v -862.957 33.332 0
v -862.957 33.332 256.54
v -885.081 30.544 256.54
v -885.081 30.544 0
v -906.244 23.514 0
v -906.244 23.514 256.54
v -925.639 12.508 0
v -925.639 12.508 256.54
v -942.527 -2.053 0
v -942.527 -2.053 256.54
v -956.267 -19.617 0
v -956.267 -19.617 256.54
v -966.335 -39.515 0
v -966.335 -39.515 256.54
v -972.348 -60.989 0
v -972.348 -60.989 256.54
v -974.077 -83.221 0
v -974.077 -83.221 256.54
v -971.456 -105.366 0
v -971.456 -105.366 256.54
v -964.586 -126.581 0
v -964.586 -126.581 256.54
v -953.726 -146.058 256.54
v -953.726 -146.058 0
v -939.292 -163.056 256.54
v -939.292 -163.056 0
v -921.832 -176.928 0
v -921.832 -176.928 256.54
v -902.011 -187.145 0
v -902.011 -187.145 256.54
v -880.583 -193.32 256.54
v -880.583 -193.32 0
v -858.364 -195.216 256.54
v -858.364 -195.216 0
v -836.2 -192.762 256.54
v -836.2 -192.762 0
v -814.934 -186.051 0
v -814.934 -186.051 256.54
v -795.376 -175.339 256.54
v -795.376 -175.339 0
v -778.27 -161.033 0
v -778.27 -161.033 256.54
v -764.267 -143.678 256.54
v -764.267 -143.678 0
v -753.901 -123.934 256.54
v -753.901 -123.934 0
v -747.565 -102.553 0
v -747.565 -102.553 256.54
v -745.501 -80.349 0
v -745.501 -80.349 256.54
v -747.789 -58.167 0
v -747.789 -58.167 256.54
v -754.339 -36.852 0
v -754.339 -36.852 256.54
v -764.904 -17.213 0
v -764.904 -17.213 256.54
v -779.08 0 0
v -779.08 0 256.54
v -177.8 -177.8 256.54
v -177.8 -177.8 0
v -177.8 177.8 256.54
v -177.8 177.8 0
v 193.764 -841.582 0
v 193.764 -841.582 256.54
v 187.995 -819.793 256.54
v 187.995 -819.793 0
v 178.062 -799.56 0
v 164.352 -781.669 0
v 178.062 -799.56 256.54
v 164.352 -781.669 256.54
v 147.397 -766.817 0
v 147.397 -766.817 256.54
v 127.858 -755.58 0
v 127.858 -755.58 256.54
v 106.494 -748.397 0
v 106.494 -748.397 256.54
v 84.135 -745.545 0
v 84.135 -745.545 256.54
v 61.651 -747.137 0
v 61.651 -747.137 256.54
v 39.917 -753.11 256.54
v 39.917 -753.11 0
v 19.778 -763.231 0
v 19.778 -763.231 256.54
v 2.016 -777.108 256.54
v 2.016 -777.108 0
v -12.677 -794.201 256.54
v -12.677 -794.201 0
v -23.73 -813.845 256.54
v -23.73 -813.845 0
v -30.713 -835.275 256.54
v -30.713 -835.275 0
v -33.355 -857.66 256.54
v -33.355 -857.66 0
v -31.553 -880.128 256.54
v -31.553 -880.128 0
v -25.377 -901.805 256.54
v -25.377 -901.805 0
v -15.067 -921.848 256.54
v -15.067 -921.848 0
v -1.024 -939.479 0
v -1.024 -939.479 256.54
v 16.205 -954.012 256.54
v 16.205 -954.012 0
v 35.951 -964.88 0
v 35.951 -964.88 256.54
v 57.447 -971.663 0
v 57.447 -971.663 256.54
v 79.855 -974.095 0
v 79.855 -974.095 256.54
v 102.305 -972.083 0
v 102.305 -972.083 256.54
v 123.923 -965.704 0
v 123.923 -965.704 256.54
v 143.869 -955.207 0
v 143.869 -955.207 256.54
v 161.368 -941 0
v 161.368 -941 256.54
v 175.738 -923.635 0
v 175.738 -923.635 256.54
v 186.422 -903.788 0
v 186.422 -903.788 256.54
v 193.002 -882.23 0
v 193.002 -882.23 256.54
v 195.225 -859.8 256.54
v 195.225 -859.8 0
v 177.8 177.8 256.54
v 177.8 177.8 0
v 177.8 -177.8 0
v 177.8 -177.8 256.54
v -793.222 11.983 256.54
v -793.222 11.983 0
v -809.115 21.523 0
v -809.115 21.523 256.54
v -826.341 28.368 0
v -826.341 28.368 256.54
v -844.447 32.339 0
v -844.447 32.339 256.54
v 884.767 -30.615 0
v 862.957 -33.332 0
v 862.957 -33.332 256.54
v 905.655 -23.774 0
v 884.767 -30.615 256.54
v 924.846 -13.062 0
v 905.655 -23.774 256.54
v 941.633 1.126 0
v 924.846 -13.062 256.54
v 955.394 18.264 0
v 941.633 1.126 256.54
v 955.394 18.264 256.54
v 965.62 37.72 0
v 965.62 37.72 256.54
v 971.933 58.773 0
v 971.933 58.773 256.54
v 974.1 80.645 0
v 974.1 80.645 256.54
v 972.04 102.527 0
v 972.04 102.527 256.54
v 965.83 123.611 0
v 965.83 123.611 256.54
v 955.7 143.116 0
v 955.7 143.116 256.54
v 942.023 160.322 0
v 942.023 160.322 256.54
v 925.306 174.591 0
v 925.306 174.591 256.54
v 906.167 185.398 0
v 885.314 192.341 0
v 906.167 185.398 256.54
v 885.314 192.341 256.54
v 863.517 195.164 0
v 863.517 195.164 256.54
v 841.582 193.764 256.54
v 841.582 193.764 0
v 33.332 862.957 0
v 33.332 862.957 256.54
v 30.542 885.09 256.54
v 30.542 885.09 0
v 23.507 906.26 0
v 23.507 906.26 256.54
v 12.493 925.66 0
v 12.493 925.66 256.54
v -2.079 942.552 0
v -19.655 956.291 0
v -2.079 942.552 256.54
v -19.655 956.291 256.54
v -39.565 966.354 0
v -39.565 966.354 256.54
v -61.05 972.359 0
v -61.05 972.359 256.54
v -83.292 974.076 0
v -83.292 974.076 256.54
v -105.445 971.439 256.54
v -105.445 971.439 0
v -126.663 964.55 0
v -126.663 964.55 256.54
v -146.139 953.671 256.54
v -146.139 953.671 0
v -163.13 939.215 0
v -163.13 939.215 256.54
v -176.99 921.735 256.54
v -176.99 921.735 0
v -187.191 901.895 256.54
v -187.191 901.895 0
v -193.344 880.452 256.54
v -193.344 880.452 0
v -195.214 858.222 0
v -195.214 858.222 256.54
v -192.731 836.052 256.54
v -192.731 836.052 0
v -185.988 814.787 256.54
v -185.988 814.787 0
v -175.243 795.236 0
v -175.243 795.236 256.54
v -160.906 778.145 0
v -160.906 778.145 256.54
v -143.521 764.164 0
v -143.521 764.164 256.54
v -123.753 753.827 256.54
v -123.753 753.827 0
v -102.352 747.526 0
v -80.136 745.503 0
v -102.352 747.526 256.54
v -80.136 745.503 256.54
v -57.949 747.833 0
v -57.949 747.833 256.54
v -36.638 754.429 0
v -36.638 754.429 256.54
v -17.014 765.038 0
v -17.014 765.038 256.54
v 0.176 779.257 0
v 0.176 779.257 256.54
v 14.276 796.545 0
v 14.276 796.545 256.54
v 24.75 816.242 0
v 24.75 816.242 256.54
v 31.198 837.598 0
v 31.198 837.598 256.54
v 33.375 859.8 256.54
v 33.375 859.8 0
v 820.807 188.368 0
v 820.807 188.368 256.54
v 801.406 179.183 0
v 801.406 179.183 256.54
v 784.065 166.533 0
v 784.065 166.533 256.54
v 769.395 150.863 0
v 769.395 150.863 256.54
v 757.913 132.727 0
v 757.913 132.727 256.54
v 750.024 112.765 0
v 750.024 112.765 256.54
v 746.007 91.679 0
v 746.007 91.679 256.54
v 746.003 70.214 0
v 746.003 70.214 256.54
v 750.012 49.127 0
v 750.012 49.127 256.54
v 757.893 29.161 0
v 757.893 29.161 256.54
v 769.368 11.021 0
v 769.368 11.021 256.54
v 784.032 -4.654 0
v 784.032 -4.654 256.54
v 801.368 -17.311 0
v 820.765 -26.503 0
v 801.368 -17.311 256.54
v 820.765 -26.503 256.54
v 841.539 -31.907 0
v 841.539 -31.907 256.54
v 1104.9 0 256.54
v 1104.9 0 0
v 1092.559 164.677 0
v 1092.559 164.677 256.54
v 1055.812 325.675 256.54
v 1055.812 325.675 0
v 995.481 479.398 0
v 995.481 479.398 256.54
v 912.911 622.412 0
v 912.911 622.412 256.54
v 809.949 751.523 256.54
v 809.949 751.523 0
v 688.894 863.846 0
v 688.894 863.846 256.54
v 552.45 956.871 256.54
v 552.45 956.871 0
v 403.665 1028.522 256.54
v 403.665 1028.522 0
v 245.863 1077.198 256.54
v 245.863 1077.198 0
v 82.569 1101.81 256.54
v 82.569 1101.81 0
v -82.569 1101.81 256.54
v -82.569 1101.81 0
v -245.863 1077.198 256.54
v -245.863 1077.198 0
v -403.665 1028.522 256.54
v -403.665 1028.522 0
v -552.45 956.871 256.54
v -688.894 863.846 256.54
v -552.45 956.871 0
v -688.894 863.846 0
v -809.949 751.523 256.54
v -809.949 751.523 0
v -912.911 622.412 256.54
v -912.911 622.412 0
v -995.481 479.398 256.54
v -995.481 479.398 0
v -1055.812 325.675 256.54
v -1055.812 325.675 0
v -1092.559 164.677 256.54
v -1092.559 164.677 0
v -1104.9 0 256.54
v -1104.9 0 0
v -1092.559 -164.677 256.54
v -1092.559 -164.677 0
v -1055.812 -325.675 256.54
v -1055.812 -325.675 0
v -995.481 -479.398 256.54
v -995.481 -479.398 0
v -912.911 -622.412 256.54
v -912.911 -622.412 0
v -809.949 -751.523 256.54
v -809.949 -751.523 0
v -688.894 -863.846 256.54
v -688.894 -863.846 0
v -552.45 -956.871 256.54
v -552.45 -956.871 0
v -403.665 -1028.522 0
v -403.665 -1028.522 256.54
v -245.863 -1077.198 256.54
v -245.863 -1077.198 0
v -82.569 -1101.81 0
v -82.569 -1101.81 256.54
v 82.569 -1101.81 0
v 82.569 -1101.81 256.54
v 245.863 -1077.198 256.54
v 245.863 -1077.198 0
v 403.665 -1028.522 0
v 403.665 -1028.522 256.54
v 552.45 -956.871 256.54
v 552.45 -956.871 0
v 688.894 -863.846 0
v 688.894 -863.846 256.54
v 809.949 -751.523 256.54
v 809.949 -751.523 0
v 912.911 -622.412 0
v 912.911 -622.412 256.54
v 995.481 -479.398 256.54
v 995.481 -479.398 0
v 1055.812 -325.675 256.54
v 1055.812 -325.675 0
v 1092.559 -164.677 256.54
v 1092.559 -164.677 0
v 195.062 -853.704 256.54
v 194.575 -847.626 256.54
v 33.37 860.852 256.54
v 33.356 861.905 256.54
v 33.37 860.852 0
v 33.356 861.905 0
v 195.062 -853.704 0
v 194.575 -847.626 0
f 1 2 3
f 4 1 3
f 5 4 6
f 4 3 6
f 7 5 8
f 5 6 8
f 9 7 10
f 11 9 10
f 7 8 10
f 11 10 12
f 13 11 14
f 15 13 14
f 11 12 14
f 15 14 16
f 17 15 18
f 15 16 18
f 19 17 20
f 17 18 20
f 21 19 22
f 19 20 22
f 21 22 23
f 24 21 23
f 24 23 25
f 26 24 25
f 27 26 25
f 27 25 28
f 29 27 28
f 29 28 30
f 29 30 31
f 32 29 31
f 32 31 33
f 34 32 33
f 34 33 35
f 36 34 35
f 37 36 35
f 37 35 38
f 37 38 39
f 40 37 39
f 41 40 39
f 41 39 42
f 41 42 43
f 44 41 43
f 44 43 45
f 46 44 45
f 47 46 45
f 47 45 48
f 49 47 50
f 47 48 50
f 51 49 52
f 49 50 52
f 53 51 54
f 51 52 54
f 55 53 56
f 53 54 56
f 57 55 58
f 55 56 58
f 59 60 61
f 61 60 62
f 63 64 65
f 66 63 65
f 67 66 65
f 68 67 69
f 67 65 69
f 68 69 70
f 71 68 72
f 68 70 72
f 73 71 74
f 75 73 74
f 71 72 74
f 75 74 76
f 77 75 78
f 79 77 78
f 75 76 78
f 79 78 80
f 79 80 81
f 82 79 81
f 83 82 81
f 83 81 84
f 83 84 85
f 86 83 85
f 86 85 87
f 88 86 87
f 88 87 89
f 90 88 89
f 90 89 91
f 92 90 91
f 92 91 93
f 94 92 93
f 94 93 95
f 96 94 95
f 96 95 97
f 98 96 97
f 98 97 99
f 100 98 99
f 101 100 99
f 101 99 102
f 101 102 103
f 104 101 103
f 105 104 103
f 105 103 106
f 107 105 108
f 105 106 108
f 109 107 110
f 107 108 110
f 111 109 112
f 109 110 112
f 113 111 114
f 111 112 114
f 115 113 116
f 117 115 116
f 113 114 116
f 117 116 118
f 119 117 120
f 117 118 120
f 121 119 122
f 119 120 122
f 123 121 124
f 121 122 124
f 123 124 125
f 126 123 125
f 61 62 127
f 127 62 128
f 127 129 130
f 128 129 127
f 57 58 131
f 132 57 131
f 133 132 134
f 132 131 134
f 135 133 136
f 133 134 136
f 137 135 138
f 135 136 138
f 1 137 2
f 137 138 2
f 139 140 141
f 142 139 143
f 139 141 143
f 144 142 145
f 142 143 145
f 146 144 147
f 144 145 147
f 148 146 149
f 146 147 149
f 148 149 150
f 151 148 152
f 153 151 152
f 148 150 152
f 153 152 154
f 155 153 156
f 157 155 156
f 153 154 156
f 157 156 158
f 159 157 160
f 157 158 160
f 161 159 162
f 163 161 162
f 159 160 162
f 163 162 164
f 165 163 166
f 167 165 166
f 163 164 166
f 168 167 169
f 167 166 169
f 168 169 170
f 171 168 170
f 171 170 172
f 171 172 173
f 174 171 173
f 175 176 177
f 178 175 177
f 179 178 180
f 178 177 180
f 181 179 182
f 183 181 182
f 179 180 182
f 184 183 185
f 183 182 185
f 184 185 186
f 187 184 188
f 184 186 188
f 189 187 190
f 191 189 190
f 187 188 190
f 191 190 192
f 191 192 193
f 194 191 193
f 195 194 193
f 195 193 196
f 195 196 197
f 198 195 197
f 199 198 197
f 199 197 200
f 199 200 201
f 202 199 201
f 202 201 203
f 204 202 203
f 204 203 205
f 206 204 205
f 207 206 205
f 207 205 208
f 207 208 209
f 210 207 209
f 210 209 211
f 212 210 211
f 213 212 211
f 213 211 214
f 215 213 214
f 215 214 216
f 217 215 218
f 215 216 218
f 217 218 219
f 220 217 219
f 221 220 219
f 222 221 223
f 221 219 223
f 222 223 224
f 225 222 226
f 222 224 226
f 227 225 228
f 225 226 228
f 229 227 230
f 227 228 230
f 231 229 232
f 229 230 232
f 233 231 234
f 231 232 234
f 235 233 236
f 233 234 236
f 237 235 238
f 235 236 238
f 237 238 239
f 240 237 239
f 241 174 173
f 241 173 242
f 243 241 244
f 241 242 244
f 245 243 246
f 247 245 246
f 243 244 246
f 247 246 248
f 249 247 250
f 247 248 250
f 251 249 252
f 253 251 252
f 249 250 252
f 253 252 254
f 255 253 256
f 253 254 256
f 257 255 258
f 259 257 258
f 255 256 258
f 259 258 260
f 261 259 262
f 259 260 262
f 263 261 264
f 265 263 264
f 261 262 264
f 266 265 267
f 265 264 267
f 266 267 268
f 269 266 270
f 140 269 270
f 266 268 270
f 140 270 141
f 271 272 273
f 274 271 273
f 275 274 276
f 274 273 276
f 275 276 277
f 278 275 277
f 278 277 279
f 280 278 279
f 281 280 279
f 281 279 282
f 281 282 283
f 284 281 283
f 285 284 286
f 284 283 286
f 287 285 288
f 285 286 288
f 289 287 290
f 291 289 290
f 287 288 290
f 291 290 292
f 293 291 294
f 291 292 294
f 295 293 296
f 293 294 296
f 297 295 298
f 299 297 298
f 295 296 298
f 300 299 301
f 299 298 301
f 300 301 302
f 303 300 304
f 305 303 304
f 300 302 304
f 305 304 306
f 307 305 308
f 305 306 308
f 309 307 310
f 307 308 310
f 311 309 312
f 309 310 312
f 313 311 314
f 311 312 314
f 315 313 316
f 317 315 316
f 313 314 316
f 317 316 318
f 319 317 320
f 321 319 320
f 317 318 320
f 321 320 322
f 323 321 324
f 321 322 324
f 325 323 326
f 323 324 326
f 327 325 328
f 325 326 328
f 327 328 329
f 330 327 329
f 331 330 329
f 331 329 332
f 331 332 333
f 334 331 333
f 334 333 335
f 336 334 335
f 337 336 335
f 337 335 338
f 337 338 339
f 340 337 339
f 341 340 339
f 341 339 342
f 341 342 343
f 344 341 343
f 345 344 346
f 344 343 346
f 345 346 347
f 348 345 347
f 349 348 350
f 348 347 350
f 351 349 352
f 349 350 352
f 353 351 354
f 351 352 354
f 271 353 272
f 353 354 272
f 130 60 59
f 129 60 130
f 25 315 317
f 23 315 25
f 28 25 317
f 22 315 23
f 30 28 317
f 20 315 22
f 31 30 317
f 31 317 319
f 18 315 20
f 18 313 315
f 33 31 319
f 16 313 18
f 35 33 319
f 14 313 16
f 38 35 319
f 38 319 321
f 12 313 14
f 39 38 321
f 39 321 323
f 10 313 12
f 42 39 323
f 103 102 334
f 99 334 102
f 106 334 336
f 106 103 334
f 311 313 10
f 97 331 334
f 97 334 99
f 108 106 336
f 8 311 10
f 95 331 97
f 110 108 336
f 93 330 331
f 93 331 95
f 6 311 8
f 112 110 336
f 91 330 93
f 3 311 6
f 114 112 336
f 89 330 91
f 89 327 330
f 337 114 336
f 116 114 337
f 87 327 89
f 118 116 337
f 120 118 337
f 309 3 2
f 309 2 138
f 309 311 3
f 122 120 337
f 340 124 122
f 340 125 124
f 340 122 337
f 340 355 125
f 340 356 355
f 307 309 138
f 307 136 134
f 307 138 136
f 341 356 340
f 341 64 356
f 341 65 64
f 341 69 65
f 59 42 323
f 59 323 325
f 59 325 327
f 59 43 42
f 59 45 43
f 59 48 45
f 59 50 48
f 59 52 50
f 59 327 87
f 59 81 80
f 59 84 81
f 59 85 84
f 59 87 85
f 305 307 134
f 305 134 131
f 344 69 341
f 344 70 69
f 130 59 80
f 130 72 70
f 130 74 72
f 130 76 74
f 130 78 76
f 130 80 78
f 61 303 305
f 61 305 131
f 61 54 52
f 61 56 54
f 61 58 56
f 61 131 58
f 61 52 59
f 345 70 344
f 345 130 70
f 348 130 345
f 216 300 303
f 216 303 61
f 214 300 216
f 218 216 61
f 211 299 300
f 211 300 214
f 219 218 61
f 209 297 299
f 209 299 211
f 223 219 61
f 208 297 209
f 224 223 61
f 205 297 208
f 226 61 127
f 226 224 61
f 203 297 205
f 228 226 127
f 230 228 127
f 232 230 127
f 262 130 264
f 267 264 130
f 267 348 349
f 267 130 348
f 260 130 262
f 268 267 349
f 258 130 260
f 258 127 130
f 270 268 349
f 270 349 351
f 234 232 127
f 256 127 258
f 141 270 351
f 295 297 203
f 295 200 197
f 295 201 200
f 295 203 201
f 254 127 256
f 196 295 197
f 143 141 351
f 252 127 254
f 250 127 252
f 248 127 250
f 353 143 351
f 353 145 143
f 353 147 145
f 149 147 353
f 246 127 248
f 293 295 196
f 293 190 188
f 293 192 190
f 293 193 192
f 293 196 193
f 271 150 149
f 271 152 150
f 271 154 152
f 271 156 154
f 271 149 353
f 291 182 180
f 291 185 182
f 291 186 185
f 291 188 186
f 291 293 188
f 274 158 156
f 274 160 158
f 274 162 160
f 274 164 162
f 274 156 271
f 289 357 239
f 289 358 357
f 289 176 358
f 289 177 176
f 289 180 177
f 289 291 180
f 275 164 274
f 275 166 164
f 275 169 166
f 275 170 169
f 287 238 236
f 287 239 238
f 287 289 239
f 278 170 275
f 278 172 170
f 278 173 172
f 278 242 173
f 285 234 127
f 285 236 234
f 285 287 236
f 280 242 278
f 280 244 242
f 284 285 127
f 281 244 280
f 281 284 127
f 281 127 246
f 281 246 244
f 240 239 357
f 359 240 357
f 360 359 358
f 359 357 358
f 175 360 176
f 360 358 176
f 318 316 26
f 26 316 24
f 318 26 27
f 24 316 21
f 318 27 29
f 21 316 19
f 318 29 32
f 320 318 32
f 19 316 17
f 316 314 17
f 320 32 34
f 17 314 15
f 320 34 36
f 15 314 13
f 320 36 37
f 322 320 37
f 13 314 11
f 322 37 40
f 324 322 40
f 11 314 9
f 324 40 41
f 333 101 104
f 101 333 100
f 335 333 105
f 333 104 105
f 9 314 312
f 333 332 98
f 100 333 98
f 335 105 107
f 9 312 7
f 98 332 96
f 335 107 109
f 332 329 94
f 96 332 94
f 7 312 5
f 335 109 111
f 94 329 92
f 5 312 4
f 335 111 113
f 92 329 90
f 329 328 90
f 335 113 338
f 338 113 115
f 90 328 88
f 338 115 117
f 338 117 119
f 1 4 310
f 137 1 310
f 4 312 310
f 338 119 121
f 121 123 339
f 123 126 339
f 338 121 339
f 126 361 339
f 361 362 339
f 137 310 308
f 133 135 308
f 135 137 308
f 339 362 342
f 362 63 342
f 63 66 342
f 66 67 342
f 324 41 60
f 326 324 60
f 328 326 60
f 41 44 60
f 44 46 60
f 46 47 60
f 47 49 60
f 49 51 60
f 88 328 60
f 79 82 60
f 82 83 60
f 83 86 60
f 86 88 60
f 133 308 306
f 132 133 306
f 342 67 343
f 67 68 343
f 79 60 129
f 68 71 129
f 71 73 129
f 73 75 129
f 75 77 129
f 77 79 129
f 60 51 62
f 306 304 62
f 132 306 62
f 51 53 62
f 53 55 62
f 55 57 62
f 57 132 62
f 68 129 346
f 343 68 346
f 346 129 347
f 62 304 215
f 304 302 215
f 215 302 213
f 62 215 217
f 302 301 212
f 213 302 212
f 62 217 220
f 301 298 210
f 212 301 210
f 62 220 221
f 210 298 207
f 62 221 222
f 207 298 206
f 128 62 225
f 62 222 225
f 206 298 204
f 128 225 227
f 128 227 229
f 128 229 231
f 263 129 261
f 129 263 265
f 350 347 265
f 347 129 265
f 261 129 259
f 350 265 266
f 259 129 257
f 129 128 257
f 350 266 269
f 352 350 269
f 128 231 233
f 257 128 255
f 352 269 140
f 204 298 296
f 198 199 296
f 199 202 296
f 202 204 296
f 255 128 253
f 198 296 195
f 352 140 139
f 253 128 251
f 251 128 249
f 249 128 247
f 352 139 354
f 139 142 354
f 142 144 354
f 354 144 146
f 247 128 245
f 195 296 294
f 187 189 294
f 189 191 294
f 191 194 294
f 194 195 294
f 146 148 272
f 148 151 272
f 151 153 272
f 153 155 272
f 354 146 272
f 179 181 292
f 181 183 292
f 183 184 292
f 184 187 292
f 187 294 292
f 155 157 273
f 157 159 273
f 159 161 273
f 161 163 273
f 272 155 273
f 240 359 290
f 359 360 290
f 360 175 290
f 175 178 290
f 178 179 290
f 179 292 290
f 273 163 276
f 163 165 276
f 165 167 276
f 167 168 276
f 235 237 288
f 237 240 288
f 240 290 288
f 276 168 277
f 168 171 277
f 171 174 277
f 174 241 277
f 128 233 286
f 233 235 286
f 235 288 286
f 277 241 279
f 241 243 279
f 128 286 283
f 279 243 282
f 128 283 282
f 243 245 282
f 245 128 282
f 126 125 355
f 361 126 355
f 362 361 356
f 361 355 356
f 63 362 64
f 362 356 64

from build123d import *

# Parameters (mm, degrees)
F0_R     = 1104.9
F0_W     = 355.6
F0_H     = 355.6
F1_DEPTH = 256.54
F3_DEPTH = 711.2


# Not quite as in the source:
# - a feature of the source that left no trace in its solid (it failed there, or was rolled back) is left out


with BuildPart() as f1:
    # F0 (on Top) → F1 (new body)
    with BuildSketch(Plane.XY):
        Circle(F0_R)
        Rectangle(F0_W, F0_H, mode=Mode.SUBTRACT)
    extrude(amount=F1_DEPTH)

    # F2 (on face) → F3 (cut)
    with BuildSketch(Plane.XY.offset(256.54)):
        with BuildLine():
            ThreePointArc((33.3315313944, 862.9565278824), (-80.9248760483, 859.8000491024), (-193.7636980758, 841.5821940298))
            ThreePointArc((-193.7636980758, 841.5821940298), (-71.7866967368, 745.8659291959), (33.3751239517, 859.8000491024))
            ThreePointArc((33.3751239517, 859.8000491024), (33.3642252927, 861.378438994), (33.3315313944, 862.9565278824))
        make_face()
        with BuildLine():
            ThreePointArc((33.3315313944, 862.9565278824), (-91.6355214077, 973.5971144248), (-193.7636980758, 841.5821940298))
            ThreePointArc((-193.7636980758, 841.5821940298), (-80.9248760483, 859.8000491024), (33.3315313944, 862.9565278824))
        make_face()
        with BuildLine():
            ThreePointArc((-841.5821940298, -193.7636980758), (-858.07789354, -97.5053261004), (-863.6, 0))
            Line((-863.6, 0), (-940.5196528958, 0))
            ThreePointArc((-940.5196528958, 0), (-961.597445048, -132.9035272304), (-841.5821940298, -193.7636980758))
        make_face()
        with BuildLine():
            ThreePointArc((-745.5000491024, -80.9248760483), (-754.2284129647, -37.1171182513), (-779.0804453091, 0))
            Line((-779.0804453091, 0), (-863.6, 0))
            ThreePointArc((-863.6, 0), (-858.07789354, -97.5053261004), (-841.5821940298, -193.7636980758))
            ThreePointArc((-841.5821940298, -193.7636980758), (-772.7747917492, -155.0267962839), (-745.5000491024, -80.9248760483))
        make_face()
        with BuildLine():
            ThreePointArc((974.1000491024, 80.9248760483), (933.901969338, 167.9501334016), (841.5821940298, 193.7636980758))
            ThreePointArc((841.5821940298, 193.7636980758), (858.07789354, 97.5053261004), (863.6, 0))
            ThreePointArc((863.6, 0), (863.4391169849, -16.6688709985), (862.9565278824, -33.3315313944))
            ThreePointArc((862.9565278824, -33.3315313944), (941.7307378721, 1.2263676701), (974.1000491024, 80.9248760483))
        make_face()
        with BuildLine():
            ThreePointArc((863.6, 0), (858.07789354, 97.5053261004), (841.5821940298, 193.7636980758))
            ThreePointArc((841.5821940298, 193.7636980758), (746.0029837801, 70.214230689), (862.9565278824, -33.3315313944))
            ThreePointArc((862.9565278824, -33.3315313944), (863.4391169849, -16.6688709985), (863.6, 0))
        make_face()
        with BuildLine():
            ThreePointArc((193.7636980758, -841.5821940298), (80.9248760483, -859.8000491024), (-33.3315313944, -862.9565278824))
            ThreePointArc((-33.3315313944, -862.9565278824), (82.5032659399, -974.0891504435), (195.2248760483, -859.8000491024))
            ThreePointArc((195.2248760483, -859.8000491024), (194.8589959549, -850.661869791), (193.7636980758, -841.5821940298))
        make_face()
        with BuildLine():
            ThreePointArc((193.7636980758, -841.5821940298), (70.214230689, -746.0029837801), (-33.3315313944, -862.9565278824))
            ThreePointArc((-33.3315313944, -862.9565278824), (80.9248760483, -859.8000491024), (193.7636980758, -841.5821940298))
        make_face()
        with BuildLine():
            Line((-940.5196528958, 0), (-863.6, 0))
            ThreePointArc((-863.6, 0), (-863.4391169849, 16.6688709985), (-862.9565278824, 33.3315313944))
            ThreePointArc((-862.9565278824, 33.3315313944), (-904.9281673131, 24.0891370488), (-940.5196528958, 0))
        make_face()
        with BuildLine():
            Line((-863.6, 0), (-779.0804453091, 0))
            ThreePointArc((-779.0804453091, 0), (-817.5891815831, 25.295332308), (-862.9565278824, 33.3315313944))
            ThreePointArc((-862.9565278824, 33.3315313944), (-863.4391169849, 16.6688709985), (-863.6, 0))
        make_face()
    extrude(amount=-F3_DEPTH, mode=Mode.SUBTRACT)


solid = f1.part
